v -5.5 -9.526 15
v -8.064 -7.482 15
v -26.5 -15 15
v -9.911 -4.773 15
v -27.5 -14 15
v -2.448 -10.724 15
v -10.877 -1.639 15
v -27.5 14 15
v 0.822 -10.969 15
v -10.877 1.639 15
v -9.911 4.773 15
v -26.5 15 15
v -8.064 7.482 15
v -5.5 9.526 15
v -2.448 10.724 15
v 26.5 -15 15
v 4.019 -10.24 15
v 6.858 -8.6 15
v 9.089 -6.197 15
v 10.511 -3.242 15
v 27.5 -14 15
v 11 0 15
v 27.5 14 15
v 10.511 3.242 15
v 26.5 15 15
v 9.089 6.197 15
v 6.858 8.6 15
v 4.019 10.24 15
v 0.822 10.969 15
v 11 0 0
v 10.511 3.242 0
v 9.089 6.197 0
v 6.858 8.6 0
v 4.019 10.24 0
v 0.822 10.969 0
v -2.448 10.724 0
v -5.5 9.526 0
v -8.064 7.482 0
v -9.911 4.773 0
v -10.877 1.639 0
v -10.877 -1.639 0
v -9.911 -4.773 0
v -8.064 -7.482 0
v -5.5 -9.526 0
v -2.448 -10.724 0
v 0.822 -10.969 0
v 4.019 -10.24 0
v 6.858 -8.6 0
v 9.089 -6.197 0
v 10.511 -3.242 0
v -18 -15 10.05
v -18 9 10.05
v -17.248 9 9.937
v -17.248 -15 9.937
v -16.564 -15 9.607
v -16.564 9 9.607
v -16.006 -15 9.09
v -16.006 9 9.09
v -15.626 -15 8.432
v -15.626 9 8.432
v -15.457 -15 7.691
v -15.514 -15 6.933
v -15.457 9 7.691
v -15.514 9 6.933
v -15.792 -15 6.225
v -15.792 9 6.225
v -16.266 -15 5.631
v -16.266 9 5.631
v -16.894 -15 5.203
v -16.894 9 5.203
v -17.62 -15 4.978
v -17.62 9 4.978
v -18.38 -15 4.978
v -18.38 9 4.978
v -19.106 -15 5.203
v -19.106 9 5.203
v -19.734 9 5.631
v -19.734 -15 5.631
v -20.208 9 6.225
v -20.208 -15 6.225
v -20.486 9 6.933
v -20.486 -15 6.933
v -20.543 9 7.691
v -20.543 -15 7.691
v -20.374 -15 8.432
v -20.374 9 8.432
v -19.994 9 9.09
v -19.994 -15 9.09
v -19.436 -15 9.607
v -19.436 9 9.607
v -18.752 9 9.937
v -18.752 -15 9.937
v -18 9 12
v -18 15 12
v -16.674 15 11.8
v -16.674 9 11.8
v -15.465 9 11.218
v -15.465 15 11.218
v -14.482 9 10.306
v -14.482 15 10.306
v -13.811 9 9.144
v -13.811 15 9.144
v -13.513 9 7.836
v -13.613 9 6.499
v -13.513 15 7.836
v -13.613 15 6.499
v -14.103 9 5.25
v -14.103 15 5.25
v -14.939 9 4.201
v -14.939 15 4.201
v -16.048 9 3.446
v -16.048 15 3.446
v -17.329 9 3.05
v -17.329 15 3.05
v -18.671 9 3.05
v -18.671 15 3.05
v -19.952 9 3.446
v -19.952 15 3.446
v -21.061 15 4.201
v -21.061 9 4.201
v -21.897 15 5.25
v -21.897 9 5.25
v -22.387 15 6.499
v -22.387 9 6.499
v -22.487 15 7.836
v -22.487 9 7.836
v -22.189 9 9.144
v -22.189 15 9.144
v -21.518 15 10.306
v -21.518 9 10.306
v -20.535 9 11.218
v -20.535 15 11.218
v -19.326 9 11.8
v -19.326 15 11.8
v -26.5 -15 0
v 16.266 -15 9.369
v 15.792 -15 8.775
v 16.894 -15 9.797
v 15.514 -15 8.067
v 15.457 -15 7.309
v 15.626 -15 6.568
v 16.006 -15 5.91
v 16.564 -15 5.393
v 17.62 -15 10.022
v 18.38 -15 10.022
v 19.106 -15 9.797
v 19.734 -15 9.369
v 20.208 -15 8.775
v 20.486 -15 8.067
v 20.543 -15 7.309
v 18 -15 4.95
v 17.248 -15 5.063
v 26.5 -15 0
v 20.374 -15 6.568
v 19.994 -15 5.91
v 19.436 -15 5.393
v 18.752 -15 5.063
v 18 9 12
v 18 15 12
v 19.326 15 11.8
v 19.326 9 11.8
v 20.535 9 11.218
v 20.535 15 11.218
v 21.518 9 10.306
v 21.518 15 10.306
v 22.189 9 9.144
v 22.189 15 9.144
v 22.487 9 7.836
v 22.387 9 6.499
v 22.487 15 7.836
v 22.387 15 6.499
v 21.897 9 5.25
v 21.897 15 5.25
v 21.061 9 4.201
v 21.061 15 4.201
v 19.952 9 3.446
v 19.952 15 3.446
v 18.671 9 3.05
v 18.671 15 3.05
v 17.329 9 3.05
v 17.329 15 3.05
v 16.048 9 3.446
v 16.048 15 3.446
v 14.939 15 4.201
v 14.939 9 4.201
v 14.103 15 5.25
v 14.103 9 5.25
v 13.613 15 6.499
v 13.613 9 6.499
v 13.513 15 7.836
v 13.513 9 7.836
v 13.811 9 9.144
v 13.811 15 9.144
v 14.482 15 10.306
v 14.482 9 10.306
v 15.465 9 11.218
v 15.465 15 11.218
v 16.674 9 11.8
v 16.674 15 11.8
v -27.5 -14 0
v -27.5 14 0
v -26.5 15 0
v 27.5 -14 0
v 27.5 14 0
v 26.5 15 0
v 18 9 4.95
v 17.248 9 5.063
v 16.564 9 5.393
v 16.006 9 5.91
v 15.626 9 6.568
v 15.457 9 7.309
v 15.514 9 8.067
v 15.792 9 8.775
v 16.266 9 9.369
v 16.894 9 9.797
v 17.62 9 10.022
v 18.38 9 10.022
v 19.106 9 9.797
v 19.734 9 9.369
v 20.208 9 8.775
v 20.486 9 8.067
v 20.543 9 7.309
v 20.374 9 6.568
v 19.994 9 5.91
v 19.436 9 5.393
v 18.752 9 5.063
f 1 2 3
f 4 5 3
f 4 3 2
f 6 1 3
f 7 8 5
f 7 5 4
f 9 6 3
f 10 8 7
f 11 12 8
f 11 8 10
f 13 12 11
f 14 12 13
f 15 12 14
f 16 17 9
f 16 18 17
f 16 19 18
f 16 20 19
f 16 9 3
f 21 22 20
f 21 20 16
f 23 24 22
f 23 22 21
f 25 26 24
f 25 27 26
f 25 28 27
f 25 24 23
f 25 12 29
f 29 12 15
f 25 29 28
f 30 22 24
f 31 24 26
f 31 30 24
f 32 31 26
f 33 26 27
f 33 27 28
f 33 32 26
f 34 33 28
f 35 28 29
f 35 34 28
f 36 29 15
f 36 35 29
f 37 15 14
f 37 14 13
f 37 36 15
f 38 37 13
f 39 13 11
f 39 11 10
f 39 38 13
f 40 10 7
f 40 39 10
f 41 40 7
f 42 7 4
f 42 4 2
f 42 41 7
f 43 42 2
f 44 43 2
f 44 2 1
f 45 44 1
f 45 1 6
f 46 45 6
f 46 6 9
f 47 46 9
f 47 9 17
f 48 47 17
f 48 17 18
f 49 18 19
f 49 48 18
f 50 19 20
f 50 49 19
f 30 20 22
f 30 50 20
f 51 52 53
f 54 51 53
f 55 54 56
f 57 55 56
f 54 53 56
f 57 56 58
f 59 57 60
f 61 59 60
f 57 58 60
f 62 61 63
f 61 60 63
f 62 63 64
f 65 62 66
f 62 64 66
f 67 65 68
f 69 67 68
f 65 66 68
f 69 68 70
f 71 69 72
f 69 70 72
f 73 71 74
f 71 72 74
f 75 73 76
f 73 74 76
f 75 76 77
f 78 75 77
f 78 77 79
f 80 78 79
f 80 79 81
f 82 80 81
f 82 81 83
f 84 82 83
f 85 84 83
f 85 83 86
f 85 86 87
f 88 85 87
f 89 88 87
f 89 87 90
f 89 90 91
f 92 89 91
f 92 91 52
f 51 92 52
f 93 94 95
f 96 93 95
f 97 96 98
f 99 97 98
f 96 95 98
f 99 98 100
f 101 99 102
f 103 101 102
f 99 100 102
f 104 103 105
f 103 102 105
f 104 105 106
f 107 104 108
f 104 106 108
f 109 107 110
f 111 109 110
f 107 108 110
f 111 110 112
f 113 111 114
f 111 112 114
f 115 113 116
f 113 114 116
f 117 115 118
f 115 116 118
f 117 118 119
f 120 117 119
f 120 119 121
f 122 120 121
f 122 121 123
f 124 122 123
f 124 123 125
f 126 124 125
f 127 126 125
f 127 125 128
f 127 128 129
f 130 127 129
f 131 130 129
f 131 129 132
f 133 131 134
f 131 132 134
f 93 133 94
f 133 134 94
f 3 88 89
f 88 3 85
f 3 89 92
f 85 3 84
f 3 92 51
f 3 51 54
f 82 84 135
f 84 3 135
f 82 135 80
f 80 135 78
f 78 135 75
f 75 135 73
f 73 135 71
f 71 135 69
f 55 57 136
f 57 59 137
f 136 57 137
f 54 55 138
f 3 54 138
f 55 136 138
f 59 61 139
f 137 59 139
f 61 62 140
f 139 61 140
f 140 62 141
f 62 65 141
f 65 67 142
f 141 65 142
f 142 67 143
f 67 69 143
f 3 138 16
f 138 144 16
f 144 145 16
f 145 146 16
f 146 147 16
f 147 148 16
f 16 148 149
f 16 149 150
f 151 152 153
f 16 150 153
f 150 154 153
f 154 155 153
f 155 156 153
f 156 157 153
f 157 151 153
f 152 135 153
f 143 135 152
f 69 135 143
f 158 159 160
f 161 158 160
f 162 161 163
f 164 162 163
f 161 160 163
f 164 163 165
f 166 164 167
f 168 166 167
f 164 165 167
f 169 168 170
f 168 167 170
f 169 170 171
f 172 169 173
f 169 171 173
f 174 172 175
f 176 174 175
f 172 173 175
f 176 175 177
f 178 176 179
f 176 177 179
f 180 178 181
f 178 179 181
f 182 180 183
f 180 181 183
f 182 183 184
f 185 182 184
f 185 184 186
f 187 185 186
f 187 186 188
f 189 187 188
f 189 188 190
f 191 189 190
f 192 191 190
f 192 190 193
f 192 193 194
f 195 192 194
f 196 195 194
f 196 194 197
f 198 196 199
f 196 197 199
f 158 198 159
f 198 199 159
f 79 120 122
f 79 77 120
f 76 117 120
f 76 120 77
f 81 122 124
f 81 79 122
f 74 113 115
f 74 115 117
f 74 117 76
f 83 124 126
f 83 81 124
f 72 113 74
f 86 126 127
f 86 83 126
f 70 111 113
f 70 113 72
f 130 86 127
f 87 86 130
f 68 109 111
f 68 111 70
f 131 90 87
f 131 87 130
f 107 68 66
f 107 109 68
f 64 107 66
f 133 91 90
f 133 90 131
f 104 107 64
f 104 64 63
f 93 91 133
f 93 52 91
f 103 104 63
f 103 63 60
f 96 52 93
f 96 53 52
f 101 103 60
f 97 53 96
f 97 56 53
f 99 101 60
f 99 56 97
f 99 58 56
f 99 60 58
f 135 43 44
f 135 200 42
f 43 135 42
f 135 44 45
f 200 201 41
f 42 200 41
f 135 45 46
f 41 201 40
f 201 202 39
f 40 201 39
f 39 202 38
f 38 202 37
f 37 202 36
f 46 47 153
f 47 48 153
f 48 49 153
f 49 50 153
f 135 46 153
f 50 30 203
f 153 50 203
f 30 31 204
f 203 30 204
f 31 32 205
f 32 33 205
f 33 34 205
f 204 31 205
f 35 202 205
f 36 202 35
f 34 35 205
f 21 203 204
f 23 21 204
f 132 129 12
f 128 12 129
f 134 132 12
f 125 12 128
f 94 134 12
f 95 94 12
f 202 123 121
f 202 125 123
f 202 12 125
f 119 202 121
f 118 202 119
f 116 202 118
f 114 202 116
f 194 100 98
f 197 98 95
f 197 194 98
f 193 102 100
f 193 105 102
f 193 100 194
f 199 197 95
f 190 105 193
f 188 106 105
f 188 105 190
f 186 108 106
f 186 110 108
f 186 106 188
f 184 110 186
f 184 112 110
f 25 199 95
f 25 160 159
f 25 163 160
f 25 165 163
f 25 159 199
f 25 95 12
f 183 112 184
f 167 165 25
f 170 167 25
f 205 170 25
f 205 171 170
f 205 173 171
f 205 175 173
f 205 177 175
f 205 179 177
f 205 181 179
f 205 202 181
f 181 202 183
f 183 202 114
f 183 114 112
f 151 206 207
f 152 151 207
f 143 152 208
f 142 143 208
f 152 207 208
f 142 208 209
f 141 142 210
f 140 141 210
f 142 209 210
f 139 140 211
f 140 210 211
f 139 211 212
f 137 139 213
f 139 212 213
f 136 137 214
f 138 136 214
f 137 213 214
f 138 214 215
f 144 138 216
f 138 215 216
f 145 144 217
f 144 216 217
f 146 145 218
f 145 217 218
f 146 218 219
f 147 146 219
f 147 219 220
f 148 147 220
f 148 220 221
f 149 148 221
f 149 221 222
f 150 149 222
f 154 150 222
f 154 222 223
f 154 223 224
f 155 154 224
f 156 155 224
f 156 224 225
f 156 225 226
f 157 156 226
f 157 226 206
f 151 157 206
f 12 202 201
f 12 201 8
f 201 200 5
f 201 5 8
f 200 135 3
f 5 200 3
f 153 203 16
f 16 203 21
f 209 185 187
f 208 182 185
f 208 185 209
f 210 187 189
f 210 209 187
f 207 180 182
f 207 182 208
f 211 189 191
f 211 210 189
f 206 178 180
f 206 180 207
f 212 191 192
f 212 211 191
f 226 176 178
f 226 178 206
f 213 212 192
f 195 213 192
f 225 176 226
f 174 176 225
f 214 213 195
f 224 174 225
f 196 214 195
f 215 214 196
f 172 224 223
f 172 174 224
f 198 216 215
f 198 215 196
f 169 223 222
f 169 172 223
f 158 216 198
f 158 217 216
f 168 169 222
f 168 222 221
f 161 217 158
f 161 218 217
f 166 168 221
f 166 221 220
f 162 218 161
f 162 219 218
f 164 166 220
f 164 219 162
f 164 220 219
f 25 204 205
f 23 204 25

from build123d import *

# Parameters (mm, degrees)
SKETCH_1_W          = 55
SKETCH_1_H          = 30
SKETCH_1_R          = 11
EXTRUDE_1_DEPTH     = 15
SKETCH_2_R          = 2.55
CUT_EXTRUDE_1_DEPTH = 44.373378932
SKETCH_3_R          = 4.5
CUT_EXTRUDE_2_DEPTH = 6
CHAMFER_1_SIZE      = 1


with BuildPart() as part:
    # 草图1 → 凸台-拉伸1 (new body)
    with BuildSketch(Plane.XY):
        Rectangle(SKETCH_1_W, SKETCH_1_H)
        Circle(SKETCH_1_R, mode=Mode.SUBTRACT)
    extrude(amount=EXTRUDE_1_DEPTH)

    # 草图2 → 切除-拉伸1 (cut, through all)
    with BuildSketch(Plane(origin=(0, 15, 0), x_dir=(1, 0, 0), z_dir=(0, 1, 0))):
        with Locations(Location((-18, -7.5, 0), (0, 0, 270))):
            Circle(SKETCH_2_R)
        with Locations(Location((18, -7.5, 0), (0, 0, 90))):
            Circle(SKETCH_2_R)
    extrude(amount=-CUT_EXTRUDE_1_DEPTH, mode=Mode.SUBTRACT)

    # 草图3 → 切除-拉伸2 (cut)
    with BuildSketch(Plane(origin=(0, 15, 0), x_dir=(1, 0, 0), z_dir=(0, 1, 0))):
        with Locations(Location((-18, -7.5, 0), (0, 0, 270))):
            Circle(SKETCH_3_R)
        with Locations(Location((18, -7.5, 0), (0, 0, 270))):
            Circle(SKETCH_3_R)
    extrude(amount=-CUT_EXTRUDE_2_DEPTH, mode=Mode.SUBTRACT)

    # 倒角1
    chamfer_1_edges = [part.edges().sort_by_distance(p)[0] for p in [
        (-27.5, 15, 7.5),
        (27.5, 15, 7.5),
        (27.5, -15, 7.5),
        (-27.5, -15, 7.5),
    ]]
    chamfer(chamfer_1_edges, length=CHAMFER_1_SIZE)


solid = part.part
